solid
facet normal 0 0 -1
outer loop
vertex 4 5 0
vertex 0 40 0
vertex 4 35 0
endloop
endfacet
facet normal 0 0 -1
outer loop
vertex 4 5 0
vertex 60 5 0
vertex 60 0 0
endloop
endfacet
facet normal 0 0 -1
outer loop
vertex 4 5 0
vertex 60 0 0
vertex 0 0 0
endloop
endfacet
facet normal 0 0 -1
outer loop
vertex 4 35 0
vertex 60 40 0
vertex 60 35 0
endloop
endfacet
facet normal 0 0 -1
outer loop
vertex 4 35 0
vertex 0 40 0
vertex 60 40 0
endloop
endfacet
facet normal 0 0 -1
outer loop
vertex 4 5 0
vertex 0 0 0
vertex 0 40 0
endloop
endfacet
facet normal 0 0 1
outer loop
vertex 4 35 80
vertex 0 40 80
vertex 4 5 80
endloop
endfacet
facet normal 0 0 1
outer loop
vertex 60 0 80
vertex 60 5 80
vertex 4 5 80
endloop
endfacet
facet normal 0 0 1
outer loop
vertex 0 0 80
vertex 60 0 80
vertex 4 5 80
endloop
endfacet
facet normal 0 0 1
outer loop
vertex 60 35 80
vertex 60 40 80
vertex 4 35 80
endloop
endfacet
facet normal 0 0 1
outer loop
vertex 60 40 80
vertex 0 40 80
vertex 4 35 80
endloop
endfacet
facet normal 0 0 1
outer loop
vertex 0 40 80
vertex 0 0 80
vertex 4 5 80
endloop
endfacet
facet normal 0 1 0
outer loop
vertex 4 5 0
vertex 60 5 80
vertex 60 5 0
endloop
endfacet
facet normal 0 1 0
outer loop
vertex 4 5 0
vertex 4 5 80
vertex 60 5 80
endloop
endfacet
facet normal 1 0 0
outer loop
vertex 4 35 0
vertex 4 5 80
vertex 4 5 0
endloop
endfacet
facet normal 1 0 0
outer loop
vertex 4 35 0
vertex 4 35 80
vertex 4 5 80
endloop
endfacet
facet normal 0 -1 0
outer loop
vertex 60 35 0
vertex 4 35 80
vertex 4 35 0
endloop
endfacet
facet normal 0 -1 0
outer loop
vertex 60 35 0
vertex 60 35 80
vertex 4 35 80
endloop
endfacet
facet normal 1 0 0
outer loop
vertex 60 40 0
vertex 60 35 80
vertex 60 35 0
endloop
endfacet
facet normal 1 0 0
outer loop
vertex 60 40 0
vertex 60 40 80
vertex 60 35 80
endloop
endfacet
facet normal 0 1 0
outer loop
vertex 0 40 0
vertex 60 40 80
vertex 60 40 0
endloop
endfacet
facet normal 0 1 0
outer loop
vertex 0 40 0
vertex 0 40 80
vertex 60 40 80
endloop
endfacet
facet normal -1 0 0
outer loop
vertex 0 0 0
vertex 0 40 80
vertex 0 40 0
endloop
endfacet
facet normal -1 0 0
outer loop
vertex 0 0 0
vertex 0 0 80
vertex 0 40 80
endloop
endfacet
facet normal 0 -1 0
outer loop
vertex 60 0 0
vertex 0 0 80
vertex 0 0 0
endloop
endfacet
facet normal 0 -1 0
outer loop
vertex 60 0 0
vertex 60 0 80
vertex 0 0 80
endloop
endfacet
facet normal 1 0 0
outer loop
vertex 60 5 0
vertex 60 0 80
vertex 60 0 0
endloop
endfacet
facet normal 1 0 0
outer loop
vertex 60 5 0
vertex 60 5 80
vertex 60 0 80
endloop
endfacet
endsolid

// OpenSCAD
$fn = 32;

// ----------------------------------------------------------------------
// Structural section: channel 60 x 40 mm
// ----------------------------------------------------------------------

// --- parameters (mm) ---
sec_w = 60;               // channel width, X
sec_h = 40;               // channel height, Y
flange_t = 5;             // flange thickness
web_t = 4;                // web thickness
plate_t = 80;             // cut length, Z (extrusion height)

profile = [[0, 0], [60, 0], [60, 5], [4, 5], [4, 35], [60, 35], [60, 40], [0, 40]];  // primary outline, 8 points, counter clockwise

// --- the one profile operation ---
linear_extrude(height = plate_t) polygon(points = profile);
